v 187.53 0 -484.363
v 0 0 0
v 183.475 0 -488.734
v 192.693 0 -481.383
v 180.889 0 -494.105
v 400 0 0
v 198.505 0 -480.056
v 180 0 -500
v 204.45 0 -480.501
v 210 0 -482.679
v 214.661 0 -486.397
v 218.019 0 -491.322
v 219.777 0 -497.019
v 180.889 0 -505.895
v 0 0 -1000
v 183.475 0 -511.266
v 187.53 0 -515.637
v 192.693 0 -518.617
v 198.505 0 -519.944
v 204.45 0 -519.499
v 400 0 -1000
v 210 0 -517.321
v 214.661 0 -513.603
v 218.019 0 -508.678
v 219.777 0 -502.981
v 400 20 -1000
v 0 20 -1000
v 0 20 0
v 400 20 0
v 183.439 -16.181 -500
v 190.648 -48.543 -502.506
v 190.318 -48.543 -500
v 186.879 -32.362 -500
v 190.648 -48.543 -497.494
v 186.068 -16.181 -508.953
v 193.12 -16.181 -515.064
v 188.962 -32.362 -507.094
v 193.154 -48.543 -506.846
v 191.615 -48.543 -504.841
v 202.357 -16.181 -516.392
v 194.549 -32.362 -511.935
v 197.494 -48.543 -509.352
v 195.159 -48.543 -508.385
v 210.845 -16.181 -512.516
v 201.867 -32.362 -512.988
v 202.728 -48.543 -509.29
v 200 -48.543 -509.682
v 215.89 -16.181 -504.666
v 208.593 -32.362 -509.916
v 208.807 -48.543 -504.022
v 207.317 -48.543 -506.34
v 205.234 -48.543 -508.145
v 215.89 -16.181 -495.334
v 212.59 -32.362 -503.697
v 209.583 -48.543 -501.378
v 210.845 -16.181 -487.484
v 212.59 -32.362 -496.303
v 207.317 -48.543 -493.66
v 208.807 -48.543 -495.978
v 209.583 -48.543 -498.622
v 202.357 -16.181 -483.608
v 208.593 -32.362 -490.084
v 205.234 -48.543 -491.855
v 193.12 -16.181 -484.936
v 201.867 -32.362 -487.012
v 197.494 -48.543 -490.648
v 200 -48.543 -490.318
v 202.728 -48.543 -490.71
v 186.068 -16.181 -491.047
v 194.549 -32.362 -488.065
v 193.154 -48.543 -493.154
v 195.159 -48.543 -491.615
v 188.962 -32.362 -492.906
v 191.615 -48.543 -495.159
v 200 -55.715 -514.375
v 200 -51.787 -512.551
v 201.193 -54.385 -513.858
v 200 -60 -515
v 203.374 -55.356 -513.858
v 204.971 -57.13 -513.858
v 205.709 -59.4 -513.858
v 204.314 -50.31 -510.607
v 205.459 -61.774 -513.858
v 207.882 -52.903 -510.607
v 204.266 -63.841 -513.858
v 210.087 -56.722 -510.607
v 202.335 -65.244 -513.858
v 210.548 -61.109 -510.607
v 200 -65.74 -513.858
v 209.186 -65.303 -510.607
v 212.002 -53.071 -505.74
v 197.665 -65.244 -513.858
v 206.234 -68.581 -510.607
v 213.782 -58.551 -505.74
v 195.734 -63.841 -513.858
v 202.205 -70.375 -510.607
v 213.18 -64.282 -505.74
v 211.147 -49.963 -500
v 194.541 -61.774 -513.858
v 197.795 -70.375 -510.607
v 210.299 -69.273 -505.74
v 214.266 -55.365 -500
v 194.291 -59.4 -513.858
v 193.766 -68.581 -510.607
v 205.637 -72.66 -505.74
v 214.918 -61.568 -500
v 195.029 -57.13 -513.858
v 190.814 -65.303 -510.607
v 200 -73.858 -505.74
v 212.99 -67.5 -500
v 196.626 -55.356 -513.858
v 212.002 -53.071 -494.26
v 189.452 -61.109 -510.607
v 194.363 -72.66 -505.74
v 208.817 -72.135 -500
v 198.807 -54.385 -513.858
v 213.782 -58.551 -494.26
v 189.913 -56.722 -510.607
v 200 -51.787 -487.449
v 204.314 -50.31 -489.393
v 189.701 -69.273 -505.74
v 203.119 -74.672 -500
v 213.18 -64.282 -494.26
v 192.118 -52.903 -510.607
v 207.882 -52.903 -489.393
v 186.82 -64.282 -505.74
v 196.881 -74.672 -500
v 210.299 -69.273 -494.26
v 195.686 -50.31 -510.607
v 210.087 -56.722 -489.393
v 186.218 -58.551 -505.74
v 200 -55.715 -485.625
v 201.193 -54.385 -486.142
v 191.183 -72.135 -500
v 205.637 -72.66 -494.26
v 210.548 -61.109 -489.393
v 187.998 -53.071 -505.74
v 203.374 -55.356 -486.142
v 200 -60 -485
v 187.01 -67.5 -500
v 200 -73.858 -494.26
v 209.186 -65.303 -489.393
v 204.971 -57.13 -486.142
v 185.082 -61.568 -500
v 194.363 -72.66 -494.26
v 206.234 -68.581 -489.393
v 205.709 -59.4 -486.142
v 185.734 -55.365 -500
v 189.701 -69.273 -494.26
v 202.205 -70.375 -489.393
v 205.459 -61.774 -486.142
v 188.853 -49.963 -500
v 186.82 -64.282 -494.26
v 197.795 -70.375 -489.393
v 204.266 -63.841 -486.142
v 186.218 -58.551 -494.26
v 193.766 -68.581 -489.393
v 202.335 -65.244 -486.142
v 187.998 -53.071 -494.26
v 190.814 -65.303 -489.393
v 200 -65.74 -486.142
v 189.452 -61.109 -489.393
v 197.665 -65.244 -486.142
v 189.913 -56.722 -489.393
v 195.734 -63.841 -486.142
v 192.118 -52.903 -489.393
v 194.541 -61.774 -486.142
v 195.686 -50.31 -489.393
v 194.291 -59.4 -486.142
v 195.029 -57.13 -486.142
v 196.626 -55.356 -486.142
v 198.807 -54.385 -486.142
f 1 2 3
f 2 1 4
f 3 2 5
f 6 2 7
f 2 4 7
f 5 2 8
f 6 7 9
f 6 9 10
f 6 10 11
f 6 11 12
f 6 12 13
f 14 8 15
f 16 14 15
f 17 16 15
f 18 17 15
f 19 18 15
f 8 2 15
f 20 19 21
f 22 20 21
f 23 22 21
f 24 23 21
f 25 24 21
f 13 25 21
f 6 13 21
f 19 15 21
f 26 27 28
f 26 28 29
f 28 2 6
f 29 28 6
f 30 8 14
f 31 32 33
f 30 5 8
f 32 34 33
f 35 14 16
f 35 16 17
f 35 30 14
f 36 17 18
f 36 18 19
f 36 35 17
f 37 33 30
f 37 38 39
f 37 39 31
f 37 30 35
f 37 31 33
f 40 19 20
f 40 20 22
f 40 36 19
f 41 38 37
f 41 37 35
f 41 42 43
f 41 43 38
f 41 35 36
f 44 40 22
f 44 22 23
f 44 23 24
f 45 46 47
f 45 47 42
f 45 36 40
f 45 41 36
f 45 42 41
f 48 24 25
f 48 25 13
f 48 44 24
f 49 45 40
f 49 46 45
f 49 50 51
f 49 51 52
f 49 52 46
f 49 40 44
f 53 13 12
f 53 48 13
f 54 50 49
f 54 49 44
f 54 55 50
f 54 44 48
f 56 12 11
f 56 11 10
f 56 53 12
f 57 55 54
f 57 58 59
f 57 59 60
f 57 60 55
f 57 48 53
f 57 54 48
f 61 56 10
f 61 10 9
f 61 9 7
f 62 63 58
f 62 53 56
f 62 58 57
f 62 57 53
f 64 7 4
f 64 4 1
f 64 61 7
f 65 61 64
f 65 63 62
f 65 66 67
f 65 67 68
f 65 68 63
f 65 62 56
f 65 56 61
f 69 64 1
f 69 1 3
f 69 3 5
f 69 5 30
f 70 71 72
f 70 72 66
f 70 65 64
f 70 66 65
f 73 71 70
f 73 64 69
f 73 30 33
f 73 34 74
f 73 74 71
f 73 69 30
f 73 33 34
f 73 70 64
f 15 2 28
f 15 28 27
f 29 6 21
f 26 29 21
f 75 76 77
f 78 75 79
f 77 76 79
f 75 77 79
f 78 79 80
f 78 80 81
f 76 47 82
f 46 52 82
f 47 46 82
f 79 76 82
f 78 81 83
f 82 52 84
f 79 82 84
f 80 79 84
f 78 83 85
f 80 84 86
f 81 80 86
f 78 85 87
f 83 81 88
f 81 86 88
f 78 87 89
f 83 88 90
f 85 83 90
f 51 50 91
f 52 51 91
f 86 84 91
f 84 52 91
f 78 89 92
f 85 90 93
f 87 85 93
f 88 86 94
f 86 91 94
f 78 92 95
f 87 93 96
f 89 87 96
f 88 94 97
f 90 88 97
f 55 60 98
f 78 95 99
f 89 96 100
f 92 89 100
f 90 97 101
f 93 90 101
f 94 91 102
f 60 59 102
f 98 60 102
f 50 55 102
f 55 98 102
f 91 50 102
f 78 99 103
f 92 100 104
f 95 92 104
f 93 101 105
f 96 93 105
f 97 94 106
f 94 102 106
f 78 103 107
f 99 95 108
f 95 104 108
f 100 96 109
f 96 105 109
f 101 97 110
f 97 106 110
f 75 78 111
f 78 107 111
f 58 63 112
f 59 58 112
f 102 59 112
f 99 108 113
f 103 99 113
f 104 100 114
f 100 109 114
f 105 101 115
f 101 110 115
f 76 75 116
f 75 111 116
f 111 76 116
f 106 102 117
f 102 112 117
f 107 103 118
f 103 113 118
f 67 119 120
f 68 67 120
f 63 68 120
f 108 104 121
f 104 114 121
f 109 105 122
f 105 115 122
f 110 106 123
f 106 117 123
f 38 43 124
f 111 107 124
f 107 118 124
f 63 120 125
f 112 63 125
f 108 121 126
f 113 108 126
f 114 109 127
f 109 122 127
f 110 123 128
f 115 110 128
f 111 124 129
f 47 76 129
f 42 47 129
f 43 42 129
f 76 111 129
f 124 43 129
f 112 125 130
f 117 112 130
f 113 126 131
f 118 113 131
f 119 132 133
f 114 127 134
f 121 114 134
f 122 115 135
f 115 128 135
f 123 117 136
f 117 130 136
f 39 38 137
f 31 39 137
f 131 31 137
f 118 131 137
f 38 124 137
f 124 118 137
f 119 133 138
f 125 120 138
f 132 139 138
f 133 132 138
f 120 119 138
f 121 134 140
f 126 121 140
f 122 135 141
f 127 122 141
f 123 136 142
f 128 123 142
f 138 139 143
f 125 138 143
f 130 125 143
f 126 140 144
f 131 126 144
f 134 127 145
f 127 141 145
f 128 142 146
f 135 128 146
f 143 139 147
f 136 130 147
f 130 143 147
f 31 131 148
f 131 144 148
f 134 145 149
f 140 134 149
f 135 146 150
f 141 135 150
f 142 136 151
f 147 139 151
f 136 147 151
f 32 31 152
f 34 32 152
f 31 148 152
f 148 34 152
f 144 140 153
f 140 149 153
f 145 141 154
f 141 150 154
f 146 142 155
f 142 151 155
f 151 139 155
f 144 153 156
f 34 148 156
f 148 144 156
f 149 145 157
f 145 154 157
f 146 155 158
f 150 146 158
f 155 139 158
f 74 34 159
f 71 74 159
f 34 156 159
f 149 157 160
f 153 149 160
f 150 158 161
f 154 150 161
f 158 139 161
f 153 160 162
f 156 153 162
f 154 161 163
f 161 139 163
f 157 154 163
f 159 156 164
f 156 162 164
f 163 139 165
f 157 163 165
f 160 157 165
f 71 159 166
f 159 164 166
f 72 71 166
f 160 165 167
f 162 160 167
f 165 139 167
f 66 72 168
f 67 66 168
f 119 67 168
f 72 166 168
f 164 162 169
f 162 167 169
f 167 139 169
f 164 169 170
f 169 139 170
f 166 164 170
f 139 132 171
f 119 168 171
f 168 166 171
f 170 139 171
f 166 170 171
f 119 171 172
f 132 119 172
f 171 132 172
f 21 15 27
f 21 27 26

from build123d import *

# Parameters (mm, degrees)
SCHIZZO1_W                   = 400
SCHIZZO1_H                   = 1000
ESTRUSIONE_ESTRUSIONE1_DEPTH = 20
SCHIZZO2_R                   = 20
ESTRUSIONE_ESTRUSIONE2_DEPTH = 50
ESTRUSIONE_ESTRUSIONE2_TAPER = 12


with BuildPart() as part:
    # Schizzo1 → Estrusione-Estrusione1 (new body)
    with BuildSketch(Plane(origin=(0, 0, 0), x_dir=(1, 0, 0), z_dir=(0, 1, 0))):
        with Locations((200, 500)):
            Rectangle(SCHIZZO1_W, SCHIZZO1_H)
    extrude(amount=ESTRUSIONE_ESTRUSIONE1_DEPTH)

    # Schizzo2 → Estrusione-Estrusione2 (add)
    with BuildSketch(Plane(origin=(0, 0, 0), x_dir=(-1, 0, 0), z_dir=(0, -1, 0))):
        with Locations((-200, 500)):
            Circle(SCHIZZO2_R)
    extrude(amount=ESTRUSIONE_ESTRUSIONE2_DEPTH, taper=ESTRUSIONE_ESTRUSIONE2_TAPER)

    # Schizzo4 → Rivoluzione1 (revolve)
    with BuildSketch(Plane(origin=(200, 0, 0), x_dir=(0, 0, -1), z_dir=(1, 0, 0))):
        with BuildLine():
            Line((485, -60), (515, -60))
            ThreePointArc((515, -60), (500, -45), (485, -60))
        make_face()
    revolve(axis=Axis((200, -60, -485), (0, 0, -1)))


solid = part.part
